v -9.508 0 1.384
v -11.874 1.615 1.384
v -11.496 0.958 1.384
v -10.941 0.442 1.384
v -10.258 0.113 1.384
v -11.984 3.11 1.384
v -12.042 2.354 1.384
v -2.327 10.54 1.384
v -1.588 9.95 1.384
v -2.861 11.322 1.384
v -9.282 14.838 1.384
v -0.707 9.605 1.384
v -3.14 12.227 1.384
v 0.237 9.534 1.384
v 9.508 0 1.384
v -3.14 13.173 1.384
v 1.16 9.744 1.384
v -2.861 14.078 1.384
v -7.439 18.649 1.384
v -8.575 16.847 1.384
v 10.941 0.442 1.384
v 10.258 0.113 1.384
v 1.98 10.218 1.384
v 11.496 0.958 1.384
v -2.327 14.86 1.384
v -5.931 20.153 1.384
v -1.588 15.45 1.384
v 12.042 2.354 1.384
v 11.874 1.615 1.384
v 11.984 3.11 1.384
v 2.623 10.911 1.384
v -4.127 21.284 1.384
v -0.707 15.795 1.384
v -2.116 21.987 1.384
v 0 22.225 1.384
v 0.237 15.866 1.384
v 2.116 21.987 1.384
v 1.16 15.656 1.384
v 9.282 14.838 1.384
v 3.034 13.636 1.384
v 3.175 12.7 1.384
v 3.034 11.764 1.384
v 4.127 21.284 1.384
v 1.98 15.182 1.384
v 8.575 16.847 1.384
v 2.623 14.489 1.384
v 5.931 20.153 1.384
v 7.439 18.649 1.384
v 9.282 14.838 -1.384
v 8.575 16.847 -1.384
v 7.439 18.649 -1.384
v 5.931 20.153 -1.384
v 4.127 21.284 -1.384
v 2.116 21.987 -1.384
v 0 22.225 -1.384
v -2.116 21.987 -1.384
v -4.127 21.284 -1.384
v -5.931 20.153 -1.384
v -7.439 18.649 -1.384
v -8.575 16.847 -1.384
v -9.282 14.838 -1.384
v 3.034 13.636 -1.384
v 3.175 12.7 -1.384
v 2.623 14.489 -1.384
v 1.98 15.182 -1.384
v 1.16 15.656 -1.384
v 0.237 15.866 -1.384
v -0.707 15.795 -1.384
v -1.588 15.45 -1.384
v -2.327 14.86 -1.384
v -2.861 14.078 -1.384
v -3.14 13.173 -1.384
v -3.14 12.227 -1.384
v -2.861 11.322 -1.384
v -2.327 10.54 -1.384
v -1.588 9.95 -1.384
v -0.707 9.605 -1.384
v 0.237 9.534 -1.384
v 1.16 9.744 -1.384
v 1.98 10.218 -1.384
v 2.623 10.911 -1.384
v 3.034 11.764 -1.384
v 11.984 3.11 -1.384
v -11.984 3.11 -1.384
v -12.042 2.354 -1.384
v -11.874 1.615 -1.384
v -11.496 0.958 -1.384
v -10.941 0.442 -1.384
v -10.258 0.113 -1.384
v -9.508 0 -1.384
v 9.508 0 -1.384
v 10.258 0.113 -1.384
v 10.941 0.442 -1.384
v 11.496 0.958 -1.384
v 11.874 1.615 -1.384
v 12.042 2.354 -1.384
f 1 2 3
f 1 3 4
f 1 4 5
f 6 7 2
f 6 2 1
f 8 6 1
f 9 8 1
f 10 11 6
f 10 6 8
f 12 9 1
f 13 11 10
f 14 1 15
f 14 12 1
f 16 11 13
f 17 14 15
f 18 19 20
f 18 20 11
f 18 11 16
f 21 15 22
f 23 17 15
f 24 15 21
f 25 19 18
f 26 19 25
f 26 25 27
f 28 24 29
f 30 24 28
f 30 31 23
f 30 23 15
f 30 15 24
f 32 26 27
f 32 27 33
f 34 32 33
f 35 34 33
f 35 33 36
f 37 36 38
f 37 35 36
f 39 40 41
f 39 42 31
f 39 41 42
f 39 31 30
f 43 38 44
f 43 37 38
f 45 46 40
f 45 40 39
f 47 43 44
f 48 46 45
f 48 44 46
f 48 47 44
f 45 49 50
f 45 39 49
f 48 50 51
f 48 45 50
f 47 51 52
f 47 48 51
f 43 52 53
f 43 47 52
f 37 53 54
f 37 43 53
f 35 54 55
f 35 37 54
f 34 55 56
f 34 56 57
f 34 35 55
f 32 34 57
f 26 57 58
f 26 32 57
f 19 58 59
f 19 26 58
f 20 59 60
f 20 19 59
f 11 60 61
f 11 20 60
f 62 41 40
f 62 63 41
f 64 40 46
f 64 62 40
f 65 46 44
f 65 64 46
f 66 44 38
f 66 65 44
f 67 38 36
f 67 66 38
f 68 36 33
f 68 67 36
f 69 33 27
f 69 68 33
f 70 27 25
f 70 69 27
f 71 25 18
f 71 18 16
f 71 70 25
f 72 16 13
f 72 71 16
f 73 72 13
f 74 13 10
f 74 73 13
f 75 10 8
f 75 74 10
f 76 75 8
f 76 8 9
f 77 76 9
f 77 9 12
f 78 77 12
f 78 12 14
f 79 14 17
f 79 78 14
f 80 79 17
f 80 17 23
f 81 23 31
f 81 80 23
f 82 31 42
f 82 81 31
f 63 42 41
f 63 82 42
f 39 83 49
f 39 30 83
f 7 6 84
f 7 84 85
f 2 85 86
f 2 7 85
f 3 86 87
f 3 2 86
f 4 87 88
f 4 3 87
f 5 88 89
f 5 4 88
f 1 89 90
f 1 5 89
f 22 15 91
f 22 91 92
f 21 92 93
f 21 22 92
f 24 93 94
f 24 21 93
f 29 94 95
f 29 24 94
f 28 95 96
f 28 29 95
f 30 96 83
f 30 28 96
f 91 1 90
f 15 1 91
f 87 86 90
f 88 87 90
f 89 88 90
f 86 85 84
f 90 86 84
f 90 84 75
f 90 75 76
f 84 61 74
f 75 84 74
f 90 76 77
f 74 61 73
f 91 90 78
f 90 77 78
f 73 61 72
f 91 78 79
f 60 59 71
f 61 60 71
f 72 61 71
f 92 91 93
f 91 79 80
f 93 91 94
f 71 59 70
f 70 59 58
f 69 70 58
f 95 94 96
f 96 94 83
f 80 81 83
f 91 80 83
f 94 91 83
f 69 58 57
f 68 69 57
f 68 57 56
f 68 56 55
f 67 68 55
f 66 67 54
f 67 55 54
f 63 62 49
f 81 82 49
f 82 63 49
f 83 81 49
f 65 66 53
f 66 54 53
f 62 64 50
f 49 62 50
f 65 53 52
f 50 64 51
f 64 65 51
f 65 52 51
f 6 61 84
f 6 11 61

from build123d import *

# Parameters (mm, degrees)
SKETCH1_R           = 3.175
BOSS_EXTRUDE1_DEPTH = 1.3843


with BuildPart() as part:
    # Sketch1 → Boss-Extrude1 (new body, symmetric)
    with BuildSketch(Plane.XY):
        with BuildLine():
            Line((-9.281911907, 14.838161907), (-11.983546213, 3.110176509))
            ThreePointArc((-11.983546213, 3.110176509), (-11.495811318, 0.958331313), (-9.508369704, 0))
            Line((-9.508369704, 0), (9.508369704, 0))
            ThreePointArc((9.508369704, 0), (11.495811318, 0.958331313), (11.983546213, 3.110176509))
            Line((11.983546213, 3.110176509), (9.281911907, 14.838161907))
            ThreePointArc((9.281911907, 14.838161907), (0, 22.225), (-9.281911907, 14.838161907))
        make_face()
        with Locations((0, 12.7)):
            Circle(SKETCH1_R, mode=Mode.SUBTRACT)
    extrude(amount=BOSS_EXTRUDE1_DEPTH, both=True)


solid = part.part
